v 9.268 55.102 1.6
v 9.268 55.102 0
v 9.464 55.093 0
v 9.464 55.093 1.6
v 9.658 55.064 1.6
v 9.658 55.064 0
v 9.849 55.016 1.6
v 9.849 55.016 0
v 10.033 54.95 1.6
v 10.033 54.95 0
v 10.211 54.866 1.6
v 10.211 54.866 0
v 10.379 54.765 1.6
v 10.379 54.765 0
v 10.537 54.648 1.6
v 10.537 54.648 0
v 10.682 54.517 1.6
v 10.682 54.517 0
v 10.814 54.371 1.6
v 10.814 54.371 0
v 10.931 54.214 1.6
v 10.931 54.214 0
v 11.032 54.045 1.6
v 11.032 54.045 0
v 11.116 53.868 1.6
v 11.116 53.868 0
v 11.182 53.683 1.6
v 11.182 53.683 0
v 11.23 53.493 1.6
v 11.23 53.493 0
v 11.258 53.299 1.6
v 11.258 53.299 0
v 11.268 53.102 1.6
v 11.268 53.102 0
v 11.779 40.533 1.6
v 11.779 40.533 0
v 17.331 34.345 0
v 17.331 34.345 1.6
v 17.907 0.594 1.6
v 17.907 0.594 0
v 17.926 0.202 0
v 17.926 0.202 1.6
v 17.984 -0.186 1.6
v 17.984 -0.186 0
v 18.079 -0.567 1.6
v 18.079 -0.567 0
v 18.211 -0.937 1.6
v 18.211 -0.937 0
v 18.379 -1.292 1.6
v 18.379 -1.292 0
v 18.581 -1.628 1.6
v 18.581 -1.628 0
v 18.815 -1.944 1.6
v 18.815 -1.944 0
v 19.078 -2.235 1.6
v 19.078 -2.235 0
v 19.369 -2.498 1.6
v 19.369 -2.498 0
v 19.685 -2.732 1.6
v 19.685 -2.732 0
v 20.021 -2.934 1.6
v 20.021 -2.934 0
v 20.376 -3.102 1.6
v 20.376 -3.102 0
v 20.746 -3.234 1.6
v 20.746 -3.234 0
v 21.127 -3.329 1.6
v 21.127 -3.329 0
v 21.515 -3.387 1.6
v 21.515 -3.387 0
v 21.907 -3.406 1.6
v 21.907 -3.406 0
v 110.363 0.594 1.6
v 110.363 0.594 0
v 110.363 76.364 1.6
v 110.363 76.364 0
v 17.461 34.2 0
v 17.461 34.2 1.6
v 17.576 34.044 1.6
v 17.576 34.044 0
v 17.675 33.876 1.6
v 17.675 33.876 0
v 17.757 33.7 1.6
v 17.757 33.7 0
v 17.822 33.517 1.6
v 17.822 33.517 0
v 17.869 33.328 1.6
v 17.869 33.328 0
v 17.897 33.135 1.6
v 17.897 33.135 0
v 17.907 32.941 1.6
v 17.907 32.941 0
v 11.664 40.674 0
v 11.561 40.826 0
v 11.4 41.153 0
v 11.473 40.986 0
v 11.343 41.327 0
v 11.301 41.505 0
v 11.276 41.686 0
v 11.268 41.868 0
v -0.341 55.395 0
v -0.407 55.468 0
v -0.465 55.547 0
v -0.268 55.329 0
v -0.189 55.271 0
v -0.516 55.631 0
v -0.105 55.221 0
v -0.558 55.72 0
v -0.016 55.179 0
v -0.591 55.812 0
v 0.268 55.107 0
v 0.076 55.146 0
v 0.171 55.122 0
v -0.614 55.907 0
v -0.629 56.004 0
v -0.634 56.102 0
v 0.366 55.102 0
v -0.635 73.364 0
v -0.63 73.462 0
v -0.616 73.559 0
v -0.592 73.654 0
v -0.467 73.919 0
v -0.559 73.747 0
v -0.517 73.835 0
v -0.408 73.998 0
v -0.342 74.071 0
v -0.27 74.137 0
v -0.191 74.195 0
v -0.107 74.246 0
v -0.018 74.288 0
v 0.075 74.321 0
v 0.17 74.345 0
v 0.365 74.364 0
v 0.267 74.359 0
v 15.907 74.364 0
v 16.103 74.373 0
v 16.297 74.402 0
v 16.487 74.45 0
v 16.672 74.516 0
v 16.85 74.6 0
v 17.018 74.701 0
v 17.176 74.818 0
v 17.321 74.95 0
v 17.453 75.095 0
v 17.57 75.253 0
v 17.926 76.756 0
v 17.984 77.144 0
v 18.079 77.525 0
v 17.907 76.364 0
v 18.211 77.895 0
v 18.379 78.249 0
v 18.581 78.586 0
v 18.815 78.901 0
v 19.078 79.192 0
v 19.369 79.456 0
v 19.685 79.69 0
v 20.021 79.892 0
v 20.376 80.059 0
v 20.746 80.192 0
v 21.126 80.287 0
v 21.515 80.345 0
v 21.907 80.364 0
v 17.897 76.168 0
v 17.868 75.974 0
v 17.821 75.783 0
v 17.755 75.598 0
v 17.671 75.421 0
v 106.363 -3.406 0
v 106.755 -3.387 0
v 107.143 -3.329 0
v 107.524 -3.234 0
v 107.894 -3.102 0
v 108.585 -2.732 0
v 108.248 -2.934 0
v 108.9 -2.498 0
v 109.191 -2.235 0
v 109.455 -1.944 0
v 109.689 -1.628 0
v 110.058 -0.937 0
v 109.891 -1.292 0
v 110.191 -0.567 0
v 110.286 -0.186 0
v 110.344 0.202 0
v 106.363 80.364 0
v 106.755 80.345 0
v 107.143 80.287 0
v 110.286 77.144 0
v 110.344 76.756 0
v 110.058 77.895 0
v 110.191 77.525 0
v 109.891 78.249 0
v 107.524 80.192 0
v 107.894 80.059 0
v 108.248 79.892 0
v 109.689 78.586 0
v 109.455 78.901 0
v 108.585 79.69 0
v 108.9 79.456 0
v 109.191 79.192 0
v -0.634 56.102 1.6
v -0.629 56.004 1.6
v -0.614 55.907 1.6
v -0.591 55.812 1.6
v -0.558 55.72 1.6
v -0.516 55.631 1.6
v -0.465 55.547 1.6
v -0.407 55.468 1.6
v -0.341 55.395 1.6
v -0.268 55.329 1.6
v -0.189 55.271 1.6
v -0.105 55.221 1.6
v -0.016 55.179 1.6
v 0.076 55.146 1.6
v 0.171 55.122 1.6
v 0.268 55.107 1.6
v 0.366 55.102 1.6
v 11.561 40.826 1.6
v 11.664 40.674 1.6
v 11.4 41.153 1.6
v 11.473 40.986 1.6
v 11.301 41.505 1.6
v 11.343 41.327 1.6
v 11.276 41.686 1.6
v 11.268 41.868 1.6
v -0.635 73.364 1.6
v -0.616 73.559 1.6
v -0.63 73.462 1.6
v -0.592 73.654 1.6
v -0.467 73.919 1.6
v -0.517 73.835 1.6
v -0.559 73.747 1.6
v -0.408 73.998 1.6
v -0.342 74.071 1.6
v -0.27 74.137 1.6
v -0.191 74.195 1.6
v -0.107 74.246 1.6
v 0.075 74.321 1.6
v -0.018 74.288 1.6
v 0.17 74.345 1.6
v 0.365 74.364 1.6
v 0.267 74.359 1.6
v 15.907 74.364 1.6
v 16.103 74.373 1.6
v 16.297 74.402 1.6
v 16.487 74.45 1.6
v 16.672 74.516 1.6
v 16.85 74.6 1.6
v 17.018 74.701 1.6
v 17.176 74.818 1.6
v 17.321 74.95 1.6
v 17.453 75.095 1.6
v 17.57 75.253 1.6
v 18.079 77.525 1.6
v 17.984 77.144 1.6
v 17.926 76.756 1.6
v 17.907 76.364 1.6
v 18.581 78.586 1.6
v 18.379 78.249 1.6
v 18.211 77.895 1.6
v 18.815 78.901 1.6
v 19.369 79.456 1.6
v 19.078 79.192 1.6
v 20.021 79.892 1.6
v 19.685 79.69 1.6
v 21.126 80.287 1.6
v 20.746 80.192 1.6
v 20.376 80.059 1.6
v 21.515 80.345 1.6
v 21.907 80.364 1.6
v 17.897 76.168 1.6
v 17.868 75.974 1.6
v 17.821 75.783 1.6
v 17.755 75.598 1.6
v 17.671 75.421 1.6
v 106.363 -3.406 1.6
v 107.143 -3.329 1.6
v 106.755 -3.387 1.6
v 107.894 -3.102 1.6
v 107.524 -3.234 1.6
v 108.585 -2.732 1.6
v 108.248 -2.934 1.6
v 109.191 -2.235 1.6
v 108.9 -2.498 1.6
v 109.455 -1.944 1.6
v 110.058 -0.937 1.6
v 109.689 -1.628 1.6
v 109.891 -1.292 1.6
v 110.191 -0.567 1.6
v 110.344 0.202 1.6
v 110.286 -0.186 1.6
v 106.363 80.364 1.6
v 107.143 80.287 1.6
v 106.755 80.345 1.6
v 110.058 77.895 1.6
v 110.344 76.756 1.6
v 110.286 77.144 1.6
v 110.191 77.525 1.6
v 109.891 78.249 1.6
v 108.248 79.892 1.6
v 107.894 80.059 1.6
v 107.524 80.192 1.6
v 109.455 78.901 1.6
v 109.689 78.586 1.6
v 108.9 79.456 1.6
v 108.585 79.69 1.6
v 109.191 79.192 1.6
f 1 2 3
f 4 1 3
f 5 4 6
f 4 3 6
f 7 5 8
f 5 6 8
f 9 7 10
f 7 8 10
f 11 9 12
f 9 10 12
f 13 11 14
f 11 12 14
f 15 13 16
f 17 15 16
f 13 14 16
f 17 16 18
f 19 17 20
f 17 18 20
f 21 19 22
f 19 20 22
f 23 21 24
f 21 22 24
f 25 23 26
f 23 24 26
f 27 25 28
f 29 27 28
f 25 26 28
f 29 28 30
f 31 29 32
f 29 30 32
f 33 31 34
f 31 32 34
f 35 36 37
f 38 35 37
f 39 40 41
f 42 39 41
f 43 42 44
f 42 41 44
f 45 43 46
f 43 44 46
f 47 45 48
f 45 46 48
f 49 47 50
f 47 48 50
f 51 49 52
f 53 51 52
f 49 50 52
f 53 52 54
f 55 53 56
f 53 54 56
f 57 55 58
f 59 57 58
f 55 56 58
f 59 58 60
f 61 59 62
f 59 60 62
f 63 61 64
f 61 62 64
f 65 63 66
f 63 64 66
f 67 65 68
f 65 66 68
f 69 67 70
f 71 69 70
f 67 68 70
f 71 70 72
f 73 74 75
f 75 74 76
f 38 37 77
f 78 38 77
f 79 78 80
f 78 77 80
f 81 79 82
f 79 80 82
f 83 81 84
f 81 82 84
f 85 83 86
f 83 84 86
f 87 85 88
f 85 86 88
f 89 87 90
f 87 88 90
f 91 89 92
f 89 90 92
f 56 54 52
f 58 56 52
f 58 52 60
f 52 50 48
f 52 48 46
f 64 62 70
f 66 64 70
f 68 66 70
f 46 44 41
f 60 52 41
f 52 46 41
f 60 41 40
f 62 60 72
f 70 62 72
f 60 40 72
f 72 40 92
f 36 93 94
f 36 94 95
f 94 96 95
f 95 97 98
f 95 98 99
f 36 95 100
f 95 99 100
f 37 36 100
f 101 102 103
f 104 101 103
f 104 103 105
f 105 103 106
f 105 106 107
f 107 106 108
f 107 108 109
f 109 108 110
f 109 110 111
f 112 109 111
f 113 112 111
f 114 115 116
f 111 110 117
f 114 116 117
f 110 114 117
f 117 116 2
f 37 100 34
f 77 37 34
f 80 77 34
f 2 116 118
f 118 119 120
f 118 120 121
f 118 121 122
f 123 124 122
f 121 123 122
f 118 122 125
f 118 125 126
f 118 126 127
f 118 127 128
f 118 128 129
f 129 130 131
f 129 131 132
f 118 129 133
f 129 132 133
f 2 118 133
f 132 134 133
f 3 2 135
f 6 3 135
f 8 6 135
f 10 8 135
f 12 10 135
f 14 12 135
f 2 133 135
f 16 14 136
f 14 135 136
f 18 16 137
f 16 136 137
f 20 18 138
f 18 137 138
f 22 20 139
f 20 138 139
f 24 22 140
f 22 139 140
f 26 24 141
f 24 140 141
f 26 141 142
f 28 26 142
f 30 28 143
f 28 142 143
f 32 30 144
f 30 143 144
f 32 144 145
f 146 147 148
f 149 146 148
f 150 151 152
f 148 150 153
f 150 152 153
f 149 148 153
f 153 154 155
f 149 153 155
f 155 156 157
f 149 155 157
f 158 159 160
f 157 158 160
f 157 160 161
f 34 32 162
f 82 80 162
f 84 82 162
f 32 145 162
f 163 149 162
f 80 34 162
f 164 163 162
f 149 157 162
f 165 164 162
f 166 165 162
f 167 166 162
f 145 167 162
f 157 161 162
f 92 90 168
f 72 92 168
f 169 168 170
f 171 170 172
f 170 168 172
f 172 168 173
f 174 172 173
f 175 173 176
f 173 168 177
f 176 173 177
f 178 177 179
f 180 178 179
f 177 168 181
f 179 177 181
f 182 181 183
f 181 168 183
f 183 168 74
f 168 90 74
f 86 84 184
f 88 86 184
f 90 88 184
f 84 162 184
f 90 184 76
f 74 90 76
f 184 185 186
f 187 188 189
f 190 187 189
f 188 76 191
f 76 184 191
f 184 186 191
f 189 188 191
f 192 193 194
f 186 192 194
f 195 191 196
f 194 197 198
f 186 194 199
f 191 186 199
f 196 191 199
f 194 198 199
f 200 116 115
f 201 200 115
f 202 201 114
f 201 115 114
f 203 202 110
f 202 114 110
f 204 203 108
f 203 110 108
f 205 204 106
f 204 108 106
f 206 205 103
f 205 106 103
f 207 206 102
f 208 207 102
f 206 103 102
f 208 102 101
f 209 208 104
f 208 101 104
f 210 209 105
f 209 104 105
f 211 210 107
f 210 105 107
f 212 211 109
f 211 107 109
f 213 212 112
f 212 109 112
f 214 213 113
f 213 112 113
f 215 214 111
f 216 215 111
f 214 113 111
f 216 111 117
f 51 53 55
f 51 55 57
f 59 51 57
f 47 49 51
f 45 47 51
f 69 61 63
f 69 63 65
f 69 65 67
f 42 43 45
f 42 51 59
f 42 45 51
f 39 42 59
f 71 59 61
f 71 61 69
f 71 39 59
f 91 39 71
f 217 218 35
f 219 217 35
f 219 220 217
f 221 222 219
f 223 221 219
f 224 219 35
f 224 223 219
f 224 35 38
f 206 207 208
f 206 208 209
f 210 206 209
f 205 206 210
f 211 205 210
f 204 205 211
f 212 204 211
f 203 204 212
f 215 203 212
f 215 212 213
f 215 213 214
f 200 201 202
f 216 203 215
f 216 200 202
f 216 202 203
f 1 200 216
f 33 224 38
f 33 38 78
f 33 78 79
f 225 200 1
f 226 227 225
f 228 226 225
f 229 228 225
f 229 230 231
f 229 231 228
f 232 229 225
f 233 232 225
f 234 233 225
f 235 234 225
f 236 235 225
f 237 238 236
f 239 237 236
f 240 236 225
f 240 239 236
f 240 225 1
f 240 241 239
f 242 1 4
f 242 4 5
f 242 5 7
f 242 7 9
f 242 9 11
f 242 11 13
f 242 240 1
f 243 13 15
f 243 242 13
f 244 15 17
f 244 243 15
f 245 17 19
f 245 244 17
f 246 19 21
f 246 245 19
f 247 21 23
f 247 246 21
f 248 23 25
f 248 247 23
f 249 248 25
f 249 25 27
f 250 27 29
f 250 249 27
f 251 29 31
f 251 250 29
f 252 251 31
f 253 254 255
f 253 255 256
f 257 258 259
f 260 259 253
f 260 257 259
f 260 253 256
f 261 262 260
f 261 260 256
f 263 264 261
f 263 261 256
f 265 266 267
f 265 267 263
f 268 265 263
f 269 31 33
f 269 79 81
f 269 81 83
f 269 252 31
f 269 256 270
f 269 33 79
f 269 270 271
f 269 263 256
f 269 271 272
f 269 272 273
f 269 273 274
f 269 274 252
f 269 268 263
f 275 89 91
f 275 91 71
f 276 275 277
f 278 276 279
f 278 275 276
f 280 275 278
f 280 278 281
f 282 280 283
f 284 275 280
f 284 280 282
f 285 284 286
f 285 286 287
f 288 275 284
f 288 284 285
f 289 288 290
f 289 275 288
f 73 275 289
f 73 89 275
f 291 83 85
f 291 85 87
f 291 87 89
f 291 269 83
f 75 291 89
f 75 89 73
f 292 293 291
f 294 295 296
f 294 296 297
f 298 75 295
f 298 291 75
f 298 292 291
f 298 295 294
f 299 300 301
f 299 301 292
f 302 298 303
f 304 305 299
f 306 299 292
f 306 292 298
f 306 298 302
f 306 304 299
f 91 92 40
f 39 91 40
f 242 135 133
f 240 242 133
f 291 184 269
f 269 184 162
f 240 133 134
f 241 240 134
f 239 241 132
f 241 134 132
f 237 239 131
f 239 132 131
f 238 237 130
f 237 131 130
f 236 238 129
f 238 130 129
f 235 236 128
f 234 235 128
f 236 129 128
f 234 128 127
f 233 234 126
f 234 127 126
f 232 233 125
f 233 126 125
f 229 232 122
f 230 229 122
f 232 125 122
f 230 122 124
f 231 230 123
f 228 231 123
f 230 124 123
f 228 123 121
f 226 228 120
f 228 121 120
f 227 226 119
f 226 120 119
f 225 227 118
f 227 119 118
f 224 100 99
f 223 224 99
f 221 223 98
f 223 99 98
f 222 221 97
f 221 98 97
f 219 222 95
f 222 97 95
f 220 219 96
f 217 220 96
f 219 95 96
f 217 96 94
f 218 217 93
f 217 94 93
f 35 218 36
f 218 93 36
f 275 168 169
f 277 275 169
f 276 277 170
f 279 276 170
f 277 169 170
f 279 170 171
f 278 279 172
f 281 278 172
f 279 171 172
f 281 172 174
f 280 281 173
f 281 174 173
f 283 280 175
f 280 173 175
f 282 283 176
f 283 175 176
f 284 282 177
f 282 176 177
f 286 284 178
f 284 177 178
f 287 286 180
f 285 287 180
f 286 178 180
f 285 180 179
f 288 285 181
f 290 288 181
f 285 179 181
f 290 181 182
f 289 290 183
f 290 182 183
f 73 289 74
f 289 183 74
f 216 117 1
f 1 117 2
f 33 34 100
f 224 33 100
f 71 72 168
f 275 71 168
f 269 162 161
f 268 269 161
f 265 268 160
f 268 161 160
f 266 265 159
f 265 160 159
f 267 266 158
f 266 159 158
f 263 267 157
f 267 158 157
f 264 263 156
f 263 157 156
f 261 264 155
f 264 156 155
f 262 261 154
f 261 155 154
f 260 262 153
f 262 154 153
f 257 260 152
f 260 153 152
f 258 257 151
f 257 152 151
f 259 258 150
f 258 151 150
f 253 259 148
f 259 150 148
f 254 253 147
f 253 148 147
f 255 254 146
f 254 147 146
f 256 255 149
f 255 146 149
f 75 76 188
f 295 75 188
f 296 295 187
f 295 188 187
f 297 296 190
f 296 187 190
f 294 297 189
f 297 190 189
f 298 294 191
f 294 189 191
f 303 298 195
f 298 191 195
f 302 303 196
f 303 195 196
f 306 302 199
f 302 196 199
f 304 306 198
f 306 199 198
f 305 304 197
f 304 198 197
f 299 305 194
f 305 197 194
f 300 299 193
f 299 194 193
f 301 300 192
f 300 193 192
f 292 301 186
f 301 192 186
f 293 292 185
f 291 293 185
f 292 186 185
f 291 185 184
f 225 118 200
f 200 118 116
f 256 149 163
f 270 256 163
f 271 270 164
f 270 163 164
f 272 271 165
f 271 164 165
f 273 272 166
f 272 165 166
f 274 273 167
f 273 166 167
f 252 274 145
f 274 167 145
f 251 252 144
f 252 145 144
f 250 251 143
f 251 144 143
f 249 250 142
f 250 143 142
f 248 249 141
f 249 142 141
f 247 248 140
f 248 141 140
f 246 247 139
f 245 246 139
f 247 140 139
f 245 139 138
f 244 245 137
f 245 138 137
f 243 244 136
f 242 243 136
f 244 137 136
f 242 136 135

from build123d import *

# Parameters (mm, degrees)
BOSS_EXTRUDE6_DEPTH = 1.6


with BuildPart() as part:
    # Sketch1 → Boss-Extrude6 (new body)
    with BuildSketch(Plane.XY):
        with BuildLine():
            Line((21.906891383, -3.406135598), (106.362891383, -3.406135598))
            ThreePointArc((106.362891383, -3.406135598), (109.191318508, -2.234562723), (110.362891383, 0.593864402))
            Line((110.362891383, 0.593864402), (110.362891383, 76.363864402))
            ThreePointArc((110.362891383, 76.363864402), (109.191318508, 79.192291526), (106.362891383, 80.363864402))
            Line((106.362891383, 80.363864402), (21.906791383, 80.363864402))
            ThreePointArc((21.906791383, 80.363864402), (19.078364258, 79.192291526), (17.906791383, 76.363864402))
            ThreePointArc((17.906791383, 76.363864402), (17.321004945, 74.949650839), (15.906791383, 74.363864402))
            Line((15.906791383, 74.363864402), (0.364791383, 74.363864402))
            ThreePointArc((0.364791383, 74.363864402), (-0.342315398, 74.070971183), (-0.635208617, 73.363864402))
            Line((-0.635208617, 73.363864402), (-0.63368713, 56.102469993))
            ThreePointArc((-0.63368713, 56.102469993), (-0.340793912, 55.395363212), (0.36631287, 55.102469993))
            Line((0.36631287, 55.102469993), (9.26811287, 55.102469993))
            ThreePointArc((9.26811287, 55.102469993), (10.682326432, 54.516683555), (11.26811287, 53.102469993))
            Line((11.26811287, 53.102469993), (11.26811287, 41.868269993))
            ThreePointArc((11.26811287, 41.868269993), (11.400327258, 41.153163772), (11.779489777, 40.532604882))
            Line((11.779489777, 40.532604882), (17.330914678, 34.345440723))
            ThreePointArc((17.330914678, 34.345440723), (17.757303341, 33.700014666), (17.906891383, 32.941064402))
            Line((17.906891383, 32.941064402), (17.906891383, 0.593864402))
            ThreePointArc((17.906891383, 0.593864402), (19.078464258, -2.234562723), (21.906891383, -3.406135598))
        make_face()
    extrude(amount=BOSS_EXTRUDE6_DEPTH)


solid = part.part
